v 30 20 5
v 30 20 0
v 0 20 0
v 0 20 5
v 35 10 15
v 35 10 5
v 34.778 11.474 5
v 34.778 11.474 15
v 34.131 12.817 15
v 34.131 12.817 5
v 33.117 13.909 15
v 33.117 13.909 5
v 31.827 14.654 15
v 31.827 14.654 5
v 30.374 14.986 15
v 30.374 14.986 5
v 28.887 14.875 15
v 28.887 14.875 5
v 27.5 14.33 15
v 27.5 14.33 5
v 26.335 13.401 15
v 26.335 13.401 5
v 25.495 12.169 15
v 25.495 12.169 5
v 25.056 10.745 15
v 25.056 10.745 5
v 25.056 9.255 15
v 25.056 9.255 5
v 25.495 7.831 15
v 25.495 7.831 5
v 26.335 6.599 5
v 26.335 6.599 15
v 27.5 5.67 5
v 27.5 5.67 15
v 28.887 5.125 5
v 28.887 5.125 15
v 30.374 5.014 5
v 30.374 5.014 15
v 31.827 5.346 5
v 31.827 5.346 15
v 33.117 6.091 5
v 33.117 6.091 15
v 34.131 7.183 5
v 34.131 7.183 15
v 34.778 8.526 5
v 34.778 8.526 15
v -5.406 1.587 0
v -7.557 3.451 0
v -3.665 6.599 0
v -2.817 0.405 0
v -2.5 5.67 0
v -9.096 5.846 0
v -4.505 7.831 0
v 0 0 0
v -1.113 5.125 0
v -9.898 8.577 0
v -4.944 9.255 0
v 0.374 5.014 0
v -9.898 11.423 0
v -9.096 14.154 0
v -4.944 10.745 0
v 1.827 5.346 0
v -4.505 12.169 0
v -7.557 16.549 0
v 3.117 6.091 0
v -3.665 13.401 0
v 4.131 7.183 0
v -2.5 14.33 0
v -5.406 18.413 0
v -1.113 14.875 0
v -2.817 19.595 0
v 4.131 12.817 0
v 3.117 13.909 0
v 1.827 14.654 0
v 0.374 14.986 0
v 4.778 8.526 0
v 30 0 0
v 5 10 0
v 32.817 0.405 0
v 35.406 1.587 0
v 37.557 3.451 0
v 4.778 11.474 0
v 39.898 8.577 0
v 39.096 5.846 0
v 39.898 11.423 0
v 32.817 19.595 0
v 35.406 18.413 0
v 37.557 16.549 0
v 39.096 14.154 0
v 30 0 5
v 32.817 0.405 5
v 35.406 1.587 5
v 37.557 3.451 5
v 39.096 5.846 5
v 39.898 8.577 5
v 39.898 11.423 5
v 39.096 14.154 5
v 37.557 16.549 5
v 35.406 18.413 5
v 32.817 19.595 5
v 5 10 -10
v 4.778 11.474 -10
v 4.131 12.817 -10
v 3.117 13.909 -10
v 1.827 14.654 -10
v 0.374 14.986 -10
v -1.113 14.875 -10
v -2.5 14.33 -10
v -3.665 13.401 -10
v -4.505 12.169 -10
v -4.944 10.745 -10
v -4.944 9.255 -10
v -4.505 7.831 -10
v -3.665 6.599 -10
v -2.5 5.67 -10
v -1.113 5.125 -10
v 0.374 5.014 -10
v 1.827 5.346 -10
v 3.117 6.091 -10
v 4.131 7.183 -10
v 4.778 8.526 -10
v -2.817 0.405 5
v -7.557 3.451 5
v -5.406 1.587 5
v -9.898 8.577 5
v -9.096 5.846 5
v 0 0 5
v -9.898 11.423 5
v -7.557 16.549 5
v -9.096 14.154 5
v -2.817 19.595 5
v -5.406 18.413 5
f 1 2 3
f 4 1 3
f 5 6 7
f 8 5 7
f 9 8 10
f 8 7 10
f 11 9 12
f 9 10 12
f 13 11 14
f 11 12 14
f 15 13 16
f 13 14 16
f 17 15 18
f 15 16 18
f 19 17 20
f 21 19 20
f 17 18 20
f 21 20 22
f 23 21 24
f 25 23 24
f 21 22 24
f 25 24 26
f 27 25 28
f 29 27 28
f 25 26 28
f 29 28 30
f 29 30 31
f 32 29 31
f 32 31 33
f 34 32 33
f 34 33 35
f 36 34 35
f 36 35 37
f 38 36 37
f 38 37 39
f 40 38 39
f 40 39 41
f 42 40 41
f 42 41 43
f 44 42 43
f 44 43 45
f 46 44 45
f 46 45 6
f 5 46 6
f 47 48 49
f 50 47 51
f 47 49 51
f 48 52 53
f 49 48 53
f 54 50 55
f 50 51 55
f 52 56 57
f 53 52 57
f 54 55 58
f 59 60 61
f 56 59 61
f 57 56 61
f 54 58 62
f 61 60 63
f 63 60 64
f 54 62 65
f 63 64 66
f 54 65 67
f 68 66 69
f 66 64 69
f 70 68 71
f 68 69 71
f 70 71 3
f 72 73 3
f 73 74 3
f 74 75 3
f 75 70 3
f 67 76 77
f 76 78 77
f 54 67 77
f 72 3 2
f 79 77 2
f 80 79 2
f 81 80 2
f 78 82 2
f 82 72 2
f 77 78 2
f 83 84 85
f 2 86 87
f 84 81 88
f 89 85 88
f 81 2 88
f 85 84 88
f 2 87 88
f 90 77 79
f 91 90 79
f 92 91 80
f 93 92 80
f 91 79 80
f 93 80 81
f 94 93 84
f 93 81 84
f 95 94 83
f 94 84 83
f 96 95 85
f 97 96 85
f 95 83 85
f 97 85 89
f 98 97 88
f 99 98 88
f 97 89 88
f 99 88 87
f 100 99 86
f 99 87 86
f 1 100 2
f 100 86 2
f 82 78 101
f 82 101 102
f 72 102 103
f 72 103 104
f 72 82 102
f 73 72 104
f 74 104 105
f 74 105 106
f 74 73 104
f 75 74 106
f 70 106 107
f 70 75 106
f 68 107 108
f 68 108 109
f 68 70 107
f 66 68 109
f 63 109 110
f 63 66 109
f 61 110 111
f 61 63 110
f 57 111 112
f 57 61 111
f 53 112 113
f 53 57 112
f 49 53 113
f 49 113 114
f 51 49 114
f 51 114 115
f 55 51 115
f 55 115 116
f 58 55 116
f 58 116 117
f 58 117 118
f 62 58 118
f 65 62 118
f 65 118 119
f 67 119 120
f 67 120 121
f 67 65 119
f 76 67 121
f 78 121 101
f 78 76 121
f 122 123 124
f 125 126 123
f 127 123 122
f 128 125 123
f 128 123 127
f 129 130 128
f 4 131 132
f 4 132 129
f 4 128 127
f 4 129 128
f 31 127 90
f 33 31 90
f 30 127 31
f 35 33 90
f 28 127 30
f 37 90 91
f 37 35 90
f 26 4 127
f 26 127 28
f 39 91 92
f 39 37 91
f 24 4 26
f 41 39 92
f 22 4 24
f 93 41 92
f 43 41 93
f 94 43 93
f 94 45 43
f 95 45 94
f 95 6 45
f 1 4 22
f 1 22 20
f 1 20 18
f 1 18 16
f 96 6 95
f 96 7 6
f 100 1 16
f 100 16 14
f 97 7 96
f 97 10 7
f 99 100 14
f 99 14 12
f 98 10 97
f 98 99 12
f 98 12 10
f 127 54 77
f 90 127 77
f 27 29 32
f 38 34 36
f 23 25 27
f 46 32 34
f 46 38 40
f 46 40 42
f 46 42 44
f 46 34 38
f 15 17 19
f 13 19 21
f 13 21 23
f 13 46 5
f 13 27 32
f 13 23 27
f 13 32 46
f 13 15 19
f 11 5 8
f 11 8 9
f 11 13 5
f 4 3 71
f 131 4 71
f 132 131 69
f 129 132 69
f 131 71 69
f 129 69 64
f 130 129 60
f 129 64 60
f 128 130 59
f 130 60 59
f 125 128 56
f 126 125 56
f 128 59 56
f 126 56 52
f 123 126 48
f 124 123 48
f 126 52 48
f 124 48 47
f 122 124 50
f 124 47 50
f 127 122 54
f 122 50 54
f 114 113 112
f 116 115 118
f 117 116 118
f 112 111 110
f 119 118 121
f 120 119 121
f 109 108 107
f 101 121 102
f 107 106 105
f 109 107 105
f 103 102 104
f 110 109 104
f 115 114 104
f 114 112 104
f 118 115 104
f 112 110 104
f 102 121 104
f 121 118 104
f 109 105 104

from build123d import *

# Parameters (mm, degrees)
F1_DEPTH = 5
F2_R     = 5
F3_DEPTH = 10
F4_R     = 5
F5_DEPTH = 15


with BuildPart() as f1:
    # F0 (on Top) → F1 (new body)
    with BuildSketch(Plane.XY):
        with BuildLine():
            ThreePointArc((0, 20), (-10, 10), (0, 0))
            Line((0, 0), (30, 0))
            ThreePointArc((30, 0), (40, 10), (30, 20))
            Line((30, 20), (0, 20))
        make_face()
    extrude(amount=F1_DEPTH)

    # F2 (on Top) → F3 (join)
    with BuildSketch(Plane.XY):
        with Locations((0, 10)):
            Circle(F2_R)
    extrude(amount=-F3_DEPTH)

    # F4 (on Top) → F5 (join)
    with BuildSketch(Plane.XY):
        with Locations((30, 10)):
            Circle(F4_R)
    extrude(amount=F5_DEPTH)


solid = f1.part
